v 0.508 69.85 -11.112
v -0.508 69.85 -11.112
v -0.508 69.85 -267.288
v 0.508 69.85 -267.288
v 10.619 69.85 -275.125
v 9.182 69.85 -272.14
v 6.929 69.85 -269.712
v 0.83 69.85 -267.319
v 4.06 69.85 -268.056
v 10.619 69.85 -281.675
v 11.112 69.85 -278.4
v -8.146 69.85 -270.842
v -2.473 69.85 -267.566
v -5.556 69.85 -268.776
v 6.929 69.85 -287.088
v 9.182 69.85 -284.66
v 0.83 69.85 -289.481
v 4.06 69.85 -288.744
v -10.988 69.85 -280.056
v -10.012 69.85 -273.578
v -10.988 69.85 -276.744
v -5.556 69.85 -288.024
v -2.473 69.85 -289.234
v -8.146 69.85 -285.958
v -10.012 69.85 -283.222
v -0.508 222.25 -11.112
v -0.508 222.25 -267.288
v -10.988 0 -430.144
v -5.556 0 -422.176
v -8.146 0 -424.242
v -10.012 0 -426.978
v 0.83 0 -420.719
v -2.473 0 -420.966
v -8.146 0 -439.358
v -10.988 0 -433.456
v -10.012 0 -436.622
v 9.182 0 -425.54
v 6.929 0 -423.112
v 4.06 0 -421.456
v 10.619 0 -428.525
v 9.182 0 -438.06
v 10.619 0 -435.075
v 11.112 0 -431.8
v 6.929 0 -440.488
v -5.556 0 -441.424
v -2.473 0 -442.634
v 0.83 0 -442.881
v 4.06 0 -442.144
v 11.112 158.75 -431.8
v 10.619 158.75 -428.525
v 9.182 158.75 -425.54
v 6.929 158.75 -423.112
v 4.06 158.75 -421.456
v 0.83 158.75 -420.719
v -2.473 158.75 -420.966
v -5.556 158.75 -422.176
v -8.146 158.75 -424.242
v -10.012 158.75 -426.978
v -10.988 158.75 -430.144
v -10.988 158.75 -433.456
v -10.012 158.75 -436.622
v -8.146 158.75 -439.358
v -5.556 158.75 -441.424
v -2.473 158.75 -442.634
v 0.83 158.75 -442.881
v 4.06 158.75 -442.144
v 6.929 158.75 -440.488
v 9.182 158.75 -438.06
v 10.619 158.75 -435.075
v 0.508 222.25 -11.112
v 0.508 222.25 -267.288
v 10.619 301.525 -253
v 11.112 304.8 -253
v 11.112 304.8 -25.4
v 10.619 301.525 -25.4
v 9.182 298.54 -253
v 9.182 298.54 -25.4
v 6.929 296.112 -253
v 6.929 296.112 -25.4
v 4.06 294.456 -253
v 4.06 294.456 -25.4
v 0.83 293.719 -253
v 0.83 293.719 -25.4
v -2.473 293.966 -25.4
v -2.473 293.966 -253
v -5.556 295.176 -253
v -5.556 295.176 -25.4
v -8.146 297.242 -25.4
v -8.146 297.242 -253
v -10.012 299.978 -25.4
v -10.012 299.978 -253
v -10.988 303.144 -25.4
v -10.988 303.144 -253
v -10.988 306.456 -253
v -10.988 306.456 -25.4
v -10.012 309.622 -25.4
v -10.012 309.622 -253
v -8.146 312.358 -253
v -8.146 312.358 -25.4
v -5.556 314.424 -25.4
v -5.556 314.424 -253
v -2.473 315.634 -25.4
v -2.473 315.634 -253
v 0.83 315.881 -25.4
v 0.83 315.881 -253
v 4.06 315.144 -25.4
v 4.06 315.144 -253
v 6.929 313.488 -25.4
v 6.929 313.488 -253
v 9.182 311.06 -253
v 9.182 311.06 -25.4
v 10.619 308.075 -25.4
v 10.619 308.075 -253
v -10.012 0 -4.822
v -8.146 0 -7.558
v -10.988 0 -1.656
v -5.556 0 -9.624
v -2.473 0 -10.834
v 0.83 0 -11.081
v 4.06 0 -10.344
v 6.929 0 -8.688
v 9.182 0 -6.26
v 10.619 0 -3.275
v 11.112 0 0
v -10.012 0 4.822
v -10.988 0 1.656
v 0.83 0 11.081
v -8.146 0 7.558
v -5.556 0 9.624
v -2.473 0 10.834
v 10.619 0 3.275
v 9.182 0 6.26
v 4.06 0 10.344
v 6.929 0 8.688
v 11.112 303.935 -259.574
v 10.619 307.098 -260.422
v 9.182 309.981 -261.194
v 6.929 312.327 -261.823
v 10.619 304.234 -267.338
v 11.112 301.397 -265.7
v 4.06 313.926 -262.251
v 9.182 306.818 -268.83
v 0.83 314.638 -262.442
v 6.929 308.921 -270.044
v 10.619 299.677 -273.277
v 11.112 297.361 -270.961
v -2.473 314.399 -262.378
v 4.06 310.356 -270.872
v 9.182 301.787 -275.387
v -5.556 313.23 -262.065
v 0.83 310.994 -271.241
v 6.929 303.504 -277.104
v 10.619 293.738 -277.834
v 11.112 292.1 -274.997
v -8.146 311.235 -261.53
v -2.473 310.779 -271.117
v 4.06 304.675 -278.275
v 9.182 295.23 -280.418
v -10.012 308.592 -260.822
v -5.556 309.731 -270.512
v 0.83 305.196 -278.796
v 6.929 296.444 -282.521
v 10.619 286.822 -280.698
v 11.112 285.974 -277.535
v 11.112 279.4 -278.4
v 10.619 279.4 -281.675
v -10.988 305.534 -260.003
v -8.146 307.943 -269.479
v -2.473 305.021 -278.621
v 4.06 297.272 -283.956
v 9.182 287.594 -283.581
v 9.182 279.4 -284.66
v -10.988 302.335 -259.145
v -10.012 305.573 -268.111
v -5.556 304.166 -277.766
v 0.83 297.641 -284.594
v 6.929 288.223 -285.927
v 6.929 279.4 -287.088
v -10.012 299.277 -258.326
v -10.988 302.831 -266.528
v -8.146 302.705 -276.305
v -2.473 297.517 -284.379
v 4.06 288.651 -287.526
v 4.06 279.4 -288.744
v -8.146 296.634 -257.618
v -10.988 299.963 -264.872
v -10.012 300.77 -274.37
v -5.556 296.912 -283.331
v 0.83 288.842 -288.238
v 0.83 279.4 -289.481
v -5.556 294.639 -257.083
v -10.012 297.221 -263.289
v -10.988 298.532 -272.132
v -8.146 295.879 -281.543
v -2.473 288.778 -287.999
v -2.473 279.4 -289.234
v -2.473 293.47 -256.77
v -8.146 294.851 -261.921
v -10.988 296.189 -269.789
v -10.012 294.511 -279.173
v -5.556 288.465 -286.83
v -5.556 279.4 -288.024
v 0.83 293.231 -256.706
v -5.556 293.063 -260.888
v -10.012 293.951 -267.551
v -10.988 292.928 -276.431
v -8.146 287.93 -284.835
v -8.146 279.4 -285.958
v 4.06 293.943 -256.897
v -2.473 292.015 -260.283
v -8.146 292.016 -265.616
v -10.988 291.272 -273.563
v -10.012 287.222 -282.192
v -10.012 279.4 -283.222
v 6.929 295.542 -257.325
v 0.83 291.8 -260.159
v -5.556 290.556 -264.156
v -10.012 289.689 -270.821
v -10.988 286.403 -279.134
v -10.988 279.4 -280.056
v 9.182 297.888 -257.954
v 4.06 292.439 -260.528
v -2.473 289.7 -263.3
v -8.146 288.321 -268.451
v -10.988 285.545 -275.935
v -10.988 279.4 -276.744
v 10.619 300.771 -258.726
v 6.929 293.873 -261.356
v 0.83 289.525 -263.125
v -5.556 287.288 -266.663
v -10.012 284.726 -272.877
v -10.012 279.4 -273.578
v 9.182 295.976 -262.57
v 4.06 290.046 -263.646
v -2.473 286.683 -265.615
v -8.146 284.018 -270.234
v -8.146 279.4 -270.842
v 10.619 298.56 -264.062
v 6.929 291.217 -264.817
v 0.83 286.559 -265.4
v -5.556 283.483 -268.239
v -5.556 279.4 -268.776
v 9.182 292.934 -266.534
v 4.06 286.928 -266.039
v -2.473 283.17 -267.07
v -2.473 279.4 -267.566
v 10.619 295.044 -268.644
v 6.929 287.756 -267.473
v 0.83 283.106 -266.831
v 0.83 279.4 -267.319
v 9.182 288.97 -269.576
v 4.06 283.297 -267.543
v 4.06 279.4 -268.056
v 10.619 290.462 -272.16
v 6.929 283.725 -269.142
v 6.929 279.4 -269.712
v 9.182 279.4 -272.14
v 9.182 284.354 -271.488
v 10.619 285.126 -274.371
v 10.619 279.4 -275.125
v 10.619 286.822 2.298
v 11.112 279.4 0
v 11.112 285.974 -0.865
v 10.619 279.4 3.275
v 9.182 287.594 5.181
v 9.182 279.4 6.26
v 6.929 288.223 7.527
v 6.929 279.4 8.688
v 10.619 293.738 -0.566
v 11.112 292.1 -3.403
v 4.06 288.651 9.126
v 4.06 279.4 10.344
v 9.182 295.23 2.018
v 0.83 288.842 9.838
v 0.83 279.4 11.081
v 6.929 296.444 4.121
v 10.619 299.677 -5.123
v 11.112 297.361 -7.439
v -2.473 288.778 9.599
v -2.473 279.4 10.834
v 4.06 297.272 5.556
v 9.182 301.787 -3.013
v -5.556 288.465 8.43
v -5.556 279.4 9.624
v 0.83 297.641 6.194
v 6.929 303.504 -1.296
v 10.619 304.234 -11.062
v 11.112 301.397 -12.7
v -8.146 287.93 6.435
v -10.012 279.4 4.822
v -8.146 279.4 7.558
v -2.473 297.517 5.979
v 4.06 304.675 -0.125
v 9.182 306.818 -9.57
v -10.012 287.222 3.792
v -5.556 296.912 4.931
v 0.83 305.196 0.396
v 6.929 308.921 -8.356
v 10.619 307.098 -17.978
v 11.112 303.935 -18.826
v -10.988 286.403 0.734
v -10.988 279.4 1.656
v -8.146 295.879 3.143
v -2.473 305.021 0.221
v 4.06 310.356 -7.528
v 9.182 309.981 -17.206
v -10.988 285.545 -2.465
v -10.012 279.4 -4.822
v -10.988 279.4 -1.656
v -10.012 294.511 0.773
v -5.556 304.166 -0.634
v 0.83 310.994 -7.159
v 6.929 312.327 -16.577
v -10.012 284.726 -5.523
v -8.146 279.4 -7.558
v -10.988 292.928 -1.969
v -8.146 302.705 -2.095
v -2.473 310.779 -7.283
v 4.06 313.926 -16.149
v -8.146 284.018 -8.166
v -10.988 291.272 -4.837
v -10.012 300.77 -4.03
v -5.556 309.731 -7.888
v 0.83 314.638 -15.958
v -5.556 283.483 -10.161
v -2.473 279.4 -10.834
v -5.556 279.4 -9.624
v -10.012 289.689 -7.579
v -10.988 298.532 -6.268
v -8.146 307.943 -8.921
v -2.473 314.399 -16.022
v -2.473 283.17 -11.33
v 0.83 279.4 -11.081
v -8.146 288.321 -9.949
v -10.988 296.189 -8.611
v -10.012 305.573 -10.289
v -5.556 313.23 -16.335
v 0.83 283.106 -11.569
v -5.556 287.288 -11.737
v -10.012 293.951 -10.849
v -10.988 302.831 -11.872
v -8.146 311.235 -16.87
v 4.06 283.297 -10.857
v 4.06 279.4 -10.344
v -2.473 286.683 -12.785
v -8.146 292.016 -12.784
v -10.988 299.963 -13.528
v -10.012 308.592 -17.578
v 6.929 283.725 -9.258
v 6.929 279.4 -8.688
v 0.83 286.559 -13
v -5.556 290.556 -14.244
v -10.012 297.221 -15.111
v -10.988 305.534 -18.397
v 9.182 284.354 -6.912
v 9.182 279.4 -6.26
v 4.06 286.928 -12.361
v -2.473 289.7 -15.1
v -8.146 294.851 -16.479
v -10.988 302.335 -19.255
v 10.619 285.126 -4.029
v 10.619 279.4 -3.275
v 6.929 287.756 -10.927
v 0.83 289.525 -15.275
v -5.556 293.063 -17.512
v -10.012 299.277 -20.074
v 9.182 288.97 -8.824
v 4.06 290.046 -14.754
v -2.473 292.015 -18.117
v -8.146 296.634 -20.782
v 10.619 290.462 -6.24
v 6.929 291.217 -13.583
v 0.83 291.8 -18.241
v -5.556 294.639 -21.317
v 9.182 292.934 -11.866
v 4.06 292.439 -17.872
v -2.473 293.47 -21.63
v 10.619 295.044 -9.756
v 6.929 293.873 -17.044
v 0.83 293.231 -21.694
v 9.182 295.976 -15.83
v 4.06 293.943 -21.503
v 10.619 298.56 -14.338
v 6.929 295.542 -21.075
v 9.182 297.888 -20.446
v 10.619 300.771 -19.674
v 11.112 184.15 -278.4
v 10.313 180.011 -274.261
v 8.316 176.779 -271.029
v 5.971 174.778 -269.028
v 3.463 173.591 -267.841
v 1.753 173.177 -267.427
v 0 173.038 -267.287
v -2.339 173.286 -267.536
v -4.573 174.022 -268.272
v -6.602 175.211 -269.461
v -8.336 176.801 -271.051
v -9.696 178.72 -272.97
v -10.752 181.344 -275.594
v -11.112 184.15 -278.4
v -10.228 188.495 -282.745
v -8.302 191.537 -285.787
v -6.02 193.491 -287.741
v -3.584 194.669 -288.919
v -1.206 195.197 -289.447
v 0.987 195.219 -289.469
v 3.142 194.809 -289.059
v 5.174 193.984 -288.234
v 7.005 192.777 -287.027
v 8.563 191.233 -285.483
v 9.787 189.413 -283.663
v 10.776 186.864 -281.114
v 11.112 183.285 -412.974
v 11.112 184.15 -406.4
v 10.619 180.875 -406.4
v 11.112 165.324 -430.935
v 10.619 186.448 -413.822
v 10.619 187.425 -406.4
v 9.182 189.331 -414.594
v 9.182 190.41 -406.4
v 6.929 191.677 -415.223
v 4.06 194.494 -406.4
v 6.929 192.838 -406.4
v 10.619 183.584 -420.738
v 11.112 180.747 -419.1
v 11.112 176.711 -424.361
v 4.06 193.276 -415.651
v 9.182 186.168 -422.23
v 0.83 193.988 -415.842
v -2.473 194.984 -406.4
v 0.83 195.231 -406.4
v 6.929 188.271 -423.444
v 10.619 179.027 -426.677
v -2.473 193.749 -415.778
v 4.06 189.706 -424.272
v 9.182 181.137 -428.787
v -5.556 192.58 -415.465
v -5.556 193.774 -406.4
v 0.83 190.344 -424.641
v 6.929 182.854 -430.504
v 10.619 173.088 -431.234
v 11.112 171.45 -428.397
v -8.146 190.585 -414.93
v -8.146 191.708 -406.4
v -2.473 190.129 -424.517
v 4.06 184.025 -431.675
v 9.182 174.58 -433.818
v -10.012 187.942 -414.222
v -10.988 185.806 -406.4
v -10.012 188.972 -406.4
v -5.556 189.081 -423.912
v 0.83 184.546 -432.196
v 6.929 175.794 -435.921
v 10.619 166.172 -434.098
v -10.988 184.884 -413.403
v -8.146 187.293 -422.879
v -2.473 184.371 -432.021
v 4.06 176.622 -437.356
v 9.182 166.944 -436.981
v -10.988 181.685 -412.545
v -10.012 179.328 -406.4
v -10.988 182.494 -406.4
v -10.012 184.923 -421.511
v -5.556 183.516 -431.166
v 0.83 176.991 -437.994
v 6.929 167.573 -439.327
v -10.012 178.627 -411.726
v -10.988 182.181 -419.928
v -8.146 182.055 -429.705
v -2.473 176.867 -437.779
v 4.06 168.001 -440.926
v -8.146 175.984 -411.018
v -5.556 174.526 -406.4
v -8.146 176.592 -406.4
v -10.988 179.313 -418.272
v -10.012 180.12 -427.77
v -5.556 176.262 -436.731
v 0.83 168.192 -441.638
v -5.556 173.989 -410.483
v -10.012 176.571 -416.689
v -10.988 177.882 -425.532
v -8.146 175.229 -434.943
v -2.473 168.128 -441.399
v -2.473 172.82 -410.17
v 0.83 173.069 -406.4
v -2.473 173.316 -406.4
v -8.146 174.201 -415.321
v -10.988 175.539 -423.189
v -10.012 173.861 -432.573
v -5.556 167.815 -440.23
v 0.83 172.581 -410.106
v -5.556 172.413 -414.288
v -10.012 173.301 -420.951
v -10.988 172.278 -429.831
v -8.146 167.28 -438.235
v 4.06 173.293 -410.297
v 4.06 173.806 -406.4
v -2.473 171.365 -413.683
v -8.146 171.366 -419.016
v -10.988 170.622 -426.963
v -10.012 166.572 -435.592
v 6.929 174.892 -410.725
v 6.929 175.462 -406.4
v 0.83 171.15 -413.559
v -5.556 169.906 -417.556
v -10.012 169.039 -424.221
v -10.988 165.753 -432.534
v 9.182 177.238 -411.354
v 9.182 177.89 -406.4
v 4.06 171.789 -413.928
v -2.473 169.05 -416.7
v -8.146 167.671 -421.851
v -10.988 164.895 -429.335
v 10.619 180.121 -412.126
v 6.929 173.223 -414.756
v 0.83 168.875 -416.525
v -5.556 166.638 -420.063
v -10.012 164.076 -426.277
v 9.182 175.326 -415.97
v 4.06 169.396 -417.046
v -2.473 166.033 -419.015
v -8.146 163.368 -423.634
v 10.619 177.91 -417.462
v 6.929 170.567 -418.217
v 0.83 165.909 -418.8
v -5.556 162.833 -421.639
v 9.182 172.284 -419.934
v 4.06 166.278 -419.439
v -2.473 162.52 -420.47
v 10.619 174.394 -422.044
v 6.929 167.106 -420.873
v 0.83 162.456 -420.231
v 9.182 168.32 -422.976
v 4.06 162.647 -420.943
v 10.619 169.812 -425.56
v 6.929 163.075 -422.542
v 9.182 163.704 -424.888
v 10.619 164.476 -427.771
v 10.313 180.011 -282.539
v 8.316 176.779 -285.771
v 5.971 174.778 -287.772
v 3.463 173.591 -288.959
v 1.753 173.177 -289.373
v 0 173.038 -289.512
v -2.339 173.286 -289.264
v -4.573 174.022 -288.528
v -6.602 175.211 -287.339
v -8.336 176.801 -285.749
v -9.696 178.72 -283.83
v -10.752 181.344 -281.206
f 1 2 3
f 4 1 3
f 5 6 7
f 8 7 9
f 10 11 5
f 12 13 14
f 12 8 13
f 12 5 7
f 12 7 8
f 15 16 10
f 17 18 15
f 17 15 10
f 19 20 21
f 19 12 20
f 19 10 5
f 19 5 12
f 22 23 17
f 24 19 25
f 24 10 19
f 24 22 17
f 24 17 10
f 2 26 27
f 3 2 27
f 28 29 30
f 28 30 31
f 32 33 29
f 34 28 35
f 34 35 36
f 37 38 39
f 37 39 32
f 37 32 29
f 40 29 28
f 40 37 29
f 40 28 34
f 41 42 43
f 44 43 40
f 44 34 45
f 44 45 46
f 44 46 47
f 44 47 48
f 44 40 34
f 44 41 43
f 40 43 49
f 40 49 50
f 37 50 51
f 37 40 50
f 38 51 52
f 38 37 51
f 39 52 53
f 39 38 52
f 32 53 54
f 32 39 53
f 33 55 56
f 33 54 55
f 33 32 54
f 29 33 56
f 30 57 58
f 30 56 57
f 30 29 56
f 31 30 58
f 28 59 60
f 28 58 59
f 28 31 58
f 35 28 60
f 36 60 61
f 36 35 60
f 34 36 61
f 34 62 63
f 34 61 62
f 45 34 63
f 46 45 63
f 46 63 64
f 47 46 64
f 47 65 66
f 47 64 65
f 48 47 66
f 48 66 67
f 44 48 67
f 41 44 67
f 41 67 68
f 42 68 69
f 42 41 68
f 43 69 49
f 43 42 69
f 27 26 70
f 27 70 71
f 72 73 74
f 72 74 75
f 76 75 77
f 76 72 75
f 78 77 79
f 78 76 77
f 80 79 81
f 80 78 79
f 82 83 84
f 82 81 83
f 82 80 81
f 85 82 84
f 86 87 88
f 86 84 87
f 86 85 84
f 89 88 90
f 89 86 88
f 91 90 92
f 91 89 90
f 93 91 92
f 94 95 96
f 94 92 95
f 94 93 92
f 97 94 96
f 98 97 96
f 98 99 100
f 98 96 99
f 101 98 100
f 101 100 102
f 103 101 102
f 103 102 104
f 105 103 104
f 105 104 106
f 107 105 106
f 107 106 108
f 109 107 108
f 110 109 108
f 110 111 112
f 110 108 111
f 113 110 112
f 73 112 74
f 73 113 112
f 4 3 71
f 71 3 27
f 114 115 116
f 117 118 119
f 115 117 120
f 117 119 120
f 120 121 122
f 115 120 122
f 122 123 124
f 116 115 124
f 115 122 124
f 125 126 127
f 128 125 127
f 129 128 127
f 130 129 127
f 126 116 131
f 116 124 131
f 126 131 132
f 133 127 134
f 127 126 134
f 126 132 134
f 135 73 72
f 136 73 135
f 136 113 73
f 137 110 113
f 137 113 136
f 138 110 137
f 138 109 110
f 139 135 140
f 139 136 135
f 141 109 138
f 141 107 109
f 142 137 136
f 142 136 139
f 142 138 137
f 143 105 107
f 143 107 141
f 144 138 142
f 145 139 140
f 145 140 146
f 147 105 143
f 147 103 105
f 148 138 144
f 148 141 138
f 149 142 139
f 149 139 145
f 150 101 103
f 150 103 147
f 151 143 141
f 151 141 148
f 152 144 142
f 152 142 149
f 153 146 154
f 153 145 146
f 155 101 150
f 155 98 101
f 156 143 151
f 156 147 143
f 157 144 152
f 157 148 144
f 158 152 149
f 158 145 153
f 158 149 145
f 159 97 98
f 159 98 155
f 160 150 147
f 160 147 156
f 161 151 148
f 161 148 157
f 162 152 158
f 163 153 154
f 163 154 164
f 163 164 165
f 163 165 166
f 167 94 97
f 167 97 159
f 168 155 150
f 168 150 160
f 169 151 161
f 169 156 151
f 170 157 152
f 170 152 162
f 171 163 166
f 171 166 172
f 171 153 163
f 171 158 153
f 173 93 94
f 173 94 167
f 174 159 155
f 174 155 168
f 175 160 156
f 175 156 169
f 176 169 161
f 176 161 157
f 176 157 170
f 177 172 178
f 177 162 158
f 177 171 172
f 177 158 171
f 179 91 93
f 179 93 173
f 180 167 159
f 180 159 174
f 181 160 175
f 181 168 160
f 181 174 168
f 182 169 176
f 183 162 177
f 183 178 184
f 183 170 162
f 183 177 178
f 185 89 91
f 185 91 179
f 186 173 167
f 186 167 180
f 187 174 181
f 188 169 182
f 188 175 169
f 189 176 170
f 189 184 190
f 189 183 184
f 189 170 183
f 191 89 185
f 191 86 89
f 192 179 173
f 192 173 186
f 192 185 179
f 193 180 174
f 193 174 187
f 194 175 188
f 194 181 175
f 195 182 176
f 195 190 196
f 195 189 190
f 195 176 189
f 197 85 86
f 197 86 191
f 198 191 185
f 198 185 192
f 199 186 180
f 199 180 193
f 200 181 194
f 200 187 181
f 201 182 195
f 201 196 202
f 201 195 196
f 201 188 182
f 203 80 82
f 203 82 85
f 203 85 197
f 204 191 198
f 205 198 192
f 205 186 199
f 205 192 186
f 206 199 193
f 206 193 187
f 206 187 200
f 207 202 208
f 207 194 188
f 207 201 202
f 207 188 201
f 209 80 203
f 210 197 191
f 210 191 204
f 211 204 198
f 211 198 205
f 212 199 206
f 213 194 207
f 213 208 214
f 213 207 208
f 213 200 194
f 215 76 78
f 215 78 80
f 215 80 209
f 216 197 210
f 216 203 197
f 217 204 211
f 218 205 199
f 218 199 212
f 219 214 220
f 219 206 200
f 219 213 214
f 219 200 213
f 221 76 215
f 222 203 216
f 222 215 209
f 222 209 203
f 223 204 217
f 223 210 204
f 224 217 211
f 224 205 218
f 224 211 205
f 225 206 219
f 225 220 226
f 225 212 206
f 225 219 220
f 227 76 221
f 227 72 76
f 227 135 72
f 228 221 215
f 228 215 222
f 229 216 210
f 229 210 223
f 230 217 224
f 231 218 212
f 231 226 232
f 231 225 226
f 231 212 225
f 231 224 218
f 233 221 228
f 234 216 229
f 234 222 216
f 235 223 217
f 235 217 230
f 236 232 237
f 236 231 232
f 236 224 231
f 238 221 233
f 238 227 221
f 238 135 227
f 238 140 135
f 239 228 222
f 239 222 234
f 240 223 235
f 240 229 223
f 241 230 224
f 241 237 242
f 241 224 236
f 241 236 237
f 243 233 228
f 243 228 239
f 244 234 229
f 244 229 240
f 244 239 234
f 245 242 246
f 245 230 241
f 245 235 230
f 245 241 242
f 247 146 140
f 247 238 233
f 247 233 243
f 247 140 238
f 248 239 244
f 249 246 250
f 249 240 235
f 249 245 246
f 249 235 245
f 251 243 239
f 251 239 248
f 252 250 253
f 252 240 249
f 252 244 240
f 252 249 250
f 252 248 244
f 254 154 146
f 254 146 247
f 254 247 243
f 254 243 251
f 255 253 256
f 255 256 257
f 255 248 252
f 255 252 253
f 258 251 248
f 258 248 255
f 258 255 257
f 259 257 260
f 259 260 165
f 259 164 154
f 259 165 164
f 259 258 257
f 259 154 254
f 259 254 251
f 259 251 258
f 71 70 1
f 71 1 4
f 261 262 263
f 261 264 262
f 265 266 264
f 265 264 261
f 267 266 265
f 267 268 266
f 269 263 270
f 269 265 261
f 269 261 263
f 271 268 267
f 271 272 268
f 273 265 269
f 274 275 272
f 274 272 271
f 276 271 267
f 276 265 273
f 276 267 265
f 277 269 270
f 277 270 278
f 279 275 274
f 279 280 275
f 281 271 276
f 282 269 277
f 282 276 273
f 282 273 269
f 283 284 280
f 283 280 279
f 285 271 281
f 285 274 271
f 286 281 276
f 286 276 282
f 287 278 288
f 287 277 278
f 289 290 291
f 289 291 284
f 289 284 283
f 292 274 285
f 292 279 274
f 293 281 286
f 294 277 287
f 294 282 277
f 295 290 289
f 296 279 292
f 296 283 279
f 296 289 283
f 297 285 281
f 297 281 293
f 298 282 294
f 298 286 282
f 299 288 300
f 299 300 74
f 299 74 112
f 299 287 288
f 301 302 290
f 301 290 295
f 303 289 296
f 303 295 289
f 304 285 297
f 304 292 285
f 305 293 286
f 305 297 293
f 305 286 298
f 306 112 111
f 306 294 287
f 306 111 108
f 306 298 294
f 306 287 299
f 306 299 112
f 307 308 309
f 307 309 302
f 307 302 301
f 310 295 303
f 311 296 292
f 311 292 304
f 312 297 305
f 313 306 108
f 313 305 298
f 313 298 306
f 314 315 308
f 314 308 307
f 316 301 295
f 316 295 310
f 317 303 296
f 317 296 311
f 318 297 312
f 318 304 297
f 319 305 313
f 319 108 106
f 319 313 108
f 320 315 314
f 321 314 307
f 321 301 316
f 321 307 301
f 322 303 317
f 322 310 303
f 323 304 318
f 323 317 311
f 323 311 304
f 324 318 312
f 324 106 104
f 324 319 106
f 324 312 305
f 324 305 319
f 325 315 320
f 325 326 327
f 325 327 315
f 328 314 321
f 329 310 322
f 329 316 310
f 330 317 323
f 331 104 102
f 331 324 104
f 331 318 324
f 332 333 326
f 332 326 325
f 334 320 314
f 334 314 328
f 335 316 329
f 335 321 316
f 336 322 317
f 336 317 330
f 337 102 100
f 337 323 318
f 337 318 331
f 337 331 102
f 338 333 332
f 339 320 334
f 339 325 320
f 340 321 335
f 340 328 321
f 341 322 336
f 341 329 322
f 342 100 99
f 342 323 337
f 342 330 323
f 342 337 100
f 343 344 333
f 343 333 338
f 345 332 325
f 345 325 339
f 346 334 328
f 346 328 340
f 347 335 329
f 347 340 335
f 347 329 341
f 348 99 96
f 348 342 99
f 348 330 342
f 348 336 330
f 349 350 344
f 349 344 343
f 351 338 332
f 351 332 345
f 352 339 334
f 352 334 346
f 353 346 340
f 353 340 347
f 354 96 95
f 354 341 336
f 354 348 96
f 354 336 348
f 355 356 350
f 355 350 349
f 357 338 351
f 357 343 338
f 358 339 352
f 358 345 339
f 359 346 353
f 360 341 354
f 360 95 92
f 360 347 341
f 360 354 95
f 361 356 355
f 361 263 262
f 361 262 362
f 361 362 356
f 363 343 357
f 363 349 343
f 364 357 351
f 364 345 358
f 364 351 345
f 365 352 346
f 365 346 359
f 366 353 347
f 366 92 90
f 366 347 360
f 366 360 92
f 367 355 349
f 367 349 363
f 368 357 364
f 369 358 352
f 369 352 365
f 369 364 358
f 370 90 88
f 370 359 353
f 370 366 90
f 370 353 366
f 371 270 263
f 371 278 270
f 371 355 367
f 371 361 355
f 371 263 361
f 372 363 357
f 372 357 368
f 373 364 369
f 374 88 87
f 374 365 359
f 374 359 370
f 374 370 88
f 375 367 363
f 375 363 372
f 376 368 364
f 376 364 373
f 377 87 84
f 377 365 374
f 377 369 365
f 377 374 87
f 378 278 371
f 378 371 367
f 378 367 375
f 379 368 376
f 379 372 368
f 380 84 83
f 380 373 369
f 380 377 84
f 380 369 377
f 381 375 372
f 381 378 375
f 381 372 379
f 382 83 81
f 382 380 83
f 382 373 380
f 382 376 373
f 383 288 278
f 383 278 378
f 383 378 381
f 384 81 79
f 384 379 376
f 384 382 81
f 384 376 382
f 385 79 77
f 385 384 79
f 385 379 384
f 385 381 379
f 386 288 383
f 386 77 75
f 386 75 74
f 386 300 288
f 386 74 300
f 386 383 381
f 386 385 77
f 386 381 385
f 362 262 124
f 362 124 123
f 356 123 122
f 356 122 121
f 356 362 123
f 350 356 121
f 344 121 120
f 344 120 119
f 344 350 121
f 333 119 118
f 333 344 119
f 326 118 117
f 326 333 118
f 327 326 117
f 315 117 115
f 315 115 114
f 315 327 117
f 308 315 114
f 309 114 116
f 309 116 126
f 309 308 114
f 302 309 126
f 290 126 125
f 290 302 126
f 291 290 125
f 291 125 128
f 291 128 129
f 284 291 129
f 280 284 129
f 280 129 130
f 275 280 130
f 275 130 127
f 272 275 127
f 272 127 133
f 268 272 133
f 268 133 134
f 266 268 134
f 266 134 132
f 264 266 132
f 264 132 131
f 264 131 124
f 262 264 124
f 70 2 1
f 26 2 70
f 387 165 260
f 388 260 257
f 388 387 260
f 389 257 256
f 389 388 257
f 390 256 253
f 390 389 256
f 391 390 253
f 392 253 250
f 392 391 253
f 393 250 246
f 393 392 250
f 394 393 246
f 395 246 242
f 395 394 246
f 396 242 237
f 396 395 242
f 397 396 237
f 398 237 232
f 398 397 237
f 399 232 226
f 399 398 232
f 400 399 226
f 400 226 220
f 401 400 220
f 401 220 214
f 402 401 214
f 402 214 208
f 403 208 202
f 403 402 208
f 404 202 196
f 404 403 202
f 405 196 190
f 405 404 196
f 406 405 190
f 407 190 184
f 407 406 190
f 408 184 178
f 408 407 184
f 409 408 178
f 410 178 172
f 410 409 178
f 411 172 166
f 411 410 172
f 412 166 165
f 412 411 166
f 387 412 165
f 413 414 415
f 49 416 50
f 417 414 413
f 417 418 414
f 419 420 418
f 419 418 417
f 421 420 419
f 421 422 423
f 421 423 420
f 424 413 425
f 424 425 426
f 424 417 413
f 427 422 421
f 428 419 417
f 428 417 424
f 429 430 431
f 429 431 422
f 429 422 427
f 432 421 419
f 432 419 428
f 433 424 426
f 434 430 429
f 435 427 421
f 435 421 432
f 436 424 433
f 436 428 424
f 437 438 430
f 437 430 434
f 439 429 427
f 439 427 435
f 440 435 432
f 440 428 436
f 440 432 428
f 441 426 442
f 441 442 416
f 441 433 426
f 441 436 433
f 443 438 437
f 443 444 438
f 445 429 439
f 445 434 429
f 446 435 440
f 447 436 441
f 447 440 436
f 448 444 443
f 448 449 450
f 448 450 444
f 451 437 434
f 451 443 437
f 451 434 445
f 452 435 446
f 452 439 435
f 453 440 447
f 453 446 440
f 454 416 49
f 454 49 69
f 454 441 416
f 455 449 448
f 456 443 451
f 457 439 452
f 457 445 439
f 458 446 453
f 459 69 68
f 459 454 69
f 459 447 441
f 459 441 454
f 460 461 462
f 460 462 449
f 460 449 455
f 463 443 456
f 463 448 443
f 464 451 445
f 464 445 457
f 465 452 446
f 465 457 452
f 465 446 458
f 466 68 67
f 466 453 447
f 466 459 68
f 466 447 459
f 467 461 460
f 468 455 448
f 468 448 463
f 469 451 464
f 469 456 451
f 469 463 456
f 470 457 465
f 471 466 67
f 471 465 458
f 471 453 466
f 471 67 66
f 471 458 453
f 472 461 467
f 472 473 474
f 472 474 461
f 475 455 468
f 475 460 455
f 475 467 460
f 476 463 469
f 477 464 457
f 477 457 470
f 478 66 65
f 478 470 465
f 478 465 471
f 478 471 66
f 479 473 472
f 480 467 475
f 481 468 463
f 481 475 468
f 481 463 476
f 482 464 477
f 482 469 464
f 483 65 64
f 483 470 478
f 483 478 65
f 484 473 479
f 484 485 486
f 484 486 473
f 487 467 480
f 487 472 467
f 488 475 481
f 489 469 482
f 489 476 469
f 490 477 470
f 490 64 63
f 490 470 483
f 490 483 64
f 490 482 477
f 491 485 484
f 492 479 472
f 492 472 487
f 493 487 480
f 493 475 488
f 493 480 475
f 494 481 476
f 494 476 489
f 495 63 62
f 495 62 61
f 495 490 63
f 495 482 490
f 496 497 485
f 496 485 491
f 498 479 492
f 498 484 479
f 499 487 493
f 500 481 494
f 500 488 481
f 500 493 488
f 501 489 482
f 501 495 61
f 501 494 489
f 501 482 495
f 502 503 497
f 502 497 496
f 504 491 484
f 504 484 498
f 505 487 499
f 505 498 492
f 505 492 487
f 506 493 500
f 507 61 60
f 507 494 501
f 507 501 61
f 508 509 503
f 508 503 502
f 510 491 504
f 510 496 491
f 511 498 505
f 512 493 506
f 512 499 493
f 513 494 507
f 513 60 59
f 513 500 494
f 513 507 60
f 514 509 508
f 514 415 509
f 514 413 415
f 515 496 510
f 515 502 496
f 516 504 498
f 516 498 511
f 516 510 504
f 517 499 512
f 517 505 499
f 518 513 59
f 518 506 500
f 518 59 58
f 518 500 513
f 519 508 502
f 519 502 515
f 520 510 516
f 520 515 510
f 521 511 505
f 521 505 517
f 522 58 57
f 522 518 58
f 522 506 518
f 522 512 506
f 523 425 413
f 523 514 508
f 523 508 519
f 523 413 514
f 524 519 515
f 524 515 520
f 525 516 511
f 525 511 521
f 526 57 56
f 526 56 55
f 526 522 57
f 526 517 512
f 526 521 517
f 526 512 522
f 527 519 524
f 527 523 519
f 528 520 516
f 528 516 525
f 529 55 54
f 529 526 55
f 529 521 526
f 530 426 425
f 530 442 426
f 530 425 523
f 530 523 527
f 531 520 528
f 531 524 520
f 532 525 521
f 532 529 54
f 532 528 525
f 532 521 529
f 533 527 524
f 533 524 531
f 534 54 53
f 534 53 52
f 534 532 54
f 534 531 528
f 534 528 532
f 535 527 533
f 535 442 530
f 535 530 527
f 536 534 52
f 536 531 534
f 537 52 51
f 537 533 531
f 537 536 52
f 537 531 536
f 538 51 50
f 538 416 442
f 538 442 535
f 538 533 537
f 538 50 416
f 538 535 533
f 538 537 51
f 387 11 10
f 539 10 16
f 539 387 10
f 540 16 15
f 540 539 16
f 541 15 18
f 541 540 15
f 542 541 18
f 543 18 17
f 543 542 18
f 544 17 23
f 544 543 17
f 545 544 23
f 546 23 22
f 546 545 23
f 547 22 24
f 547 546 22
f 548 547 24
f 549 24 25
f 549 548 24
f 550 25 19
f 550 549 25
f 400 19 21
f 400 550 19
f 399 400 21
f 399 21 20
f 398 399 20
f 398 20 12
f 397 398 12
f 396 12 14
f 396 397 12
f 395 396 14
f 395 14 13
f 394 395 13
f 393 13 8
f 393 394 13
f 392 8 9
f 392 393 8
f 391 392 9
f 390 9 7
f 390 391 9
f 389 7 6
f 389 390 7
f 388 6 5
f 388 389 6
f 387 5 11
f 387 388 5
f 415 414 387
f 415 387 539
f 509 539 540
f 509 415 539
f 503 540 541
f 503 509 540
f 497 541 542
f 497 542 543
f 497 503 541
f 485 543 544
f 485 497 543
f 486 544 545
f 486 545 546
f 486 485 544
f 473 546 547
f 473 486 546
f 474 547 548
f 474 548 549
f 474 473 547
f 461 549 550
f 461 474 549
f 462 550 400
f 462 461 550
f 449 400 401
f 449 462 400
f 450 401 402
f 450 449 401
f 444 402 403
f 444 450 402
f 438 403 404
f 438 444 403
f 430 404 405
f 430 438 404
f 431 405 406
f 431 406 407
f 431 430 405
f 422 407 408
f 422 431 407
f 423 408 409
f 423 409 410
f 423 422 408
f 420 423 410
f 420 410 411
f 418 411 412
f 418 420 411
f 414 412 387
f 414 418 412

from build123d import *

# Parameters (mm, degrees)
CROQUIS1_R                   = 11.1125
BARRER2_OUTLINE_W            = 11.1125
BARRER2_OUTLINE_H            = 209.55
SALIENTE_EXTRUIR1_DEPTH      = 0.508
SALIENTE_EXTRUIR1_DEPTH_BACK = 0.508
CROQUIS3_W                   = 256.175
CROQUIS3_H                   = 152.4


# Read off the part's stored shape, not the designer's step: Barrer2
with BuildPart() as part:
    # Barrer1: sweep along a path in Croquis2
    with BuildLine(Plane(origin=(0, 0, 0), x_dir=(0, 0, -1), z_dir=(1, 0, 0))) as barrer1_path:
        Line((0, 0), (0, 279.4))
        ThreePointArc((0, 279.4), (7.439487758, 297.360512242), (25.4, 304.8))
        Line((25.4, 304.8), (253, 304.8))
        ThreePointArc((253, 304.8), (270.960512242, 297.360512242), (278.4, 279.4))
        Line((278.4, 279.4), (278.4, 184.15))
        Line((278.4, 184.15), (406.4, 184.15))
        ThreePointArc((406.4, 184.15), (424.360512242, 176.710512242), (431.8, 158.75))
        Line((431.8, 158.75), (431.8, 0))
    # Croquis1 → Barrer1 (sweep)
    with BuildSketch(Plane(origin=(0, 0, 0), x_dir=(1, 0, 0), z_dir=(0, 1, 0))):
        Circle(CROQUIS1_R)
    sweep(path=barrer1_path.line, transition=Transition.RIGHT)

    # Barrer2 outline → Barrer2 (revolve)
    with BuildSketch(Plane.XY.offset(-278.4)):
        with Locations((5.55625, 174.625)):
            Rectangle(BARRER2_OUTLINE_W, BARRER2_OUTLINE_H)
    revolve(axis=Axis((0, 0, -278.4), (0, 1, 0)))


with BuildPart() as body_2:
    # Croquis3 → Saliente-Extruir1 (new, two sides: drawn at the far end of the back side and taken through both)
    with BuildSketch(Plane(origin=(0, 0, 0), x_dir=(0, 0, -1), z_dir=(1, 0, 0)).offset(-SALIENTE_EXTRUIR1_DEPTH_BACK)):
        with Locations((139.2, 146.05)):
            Rectangle(CROQUIS3_W, CROQUIS3_H)
    extrude(amount=SALIENTE_EXTRUIR1_DEPTH + SALIENTE_EXTRUIR1_DEPTH_BACK)


solid = Compound([part.part, body_2.part])
